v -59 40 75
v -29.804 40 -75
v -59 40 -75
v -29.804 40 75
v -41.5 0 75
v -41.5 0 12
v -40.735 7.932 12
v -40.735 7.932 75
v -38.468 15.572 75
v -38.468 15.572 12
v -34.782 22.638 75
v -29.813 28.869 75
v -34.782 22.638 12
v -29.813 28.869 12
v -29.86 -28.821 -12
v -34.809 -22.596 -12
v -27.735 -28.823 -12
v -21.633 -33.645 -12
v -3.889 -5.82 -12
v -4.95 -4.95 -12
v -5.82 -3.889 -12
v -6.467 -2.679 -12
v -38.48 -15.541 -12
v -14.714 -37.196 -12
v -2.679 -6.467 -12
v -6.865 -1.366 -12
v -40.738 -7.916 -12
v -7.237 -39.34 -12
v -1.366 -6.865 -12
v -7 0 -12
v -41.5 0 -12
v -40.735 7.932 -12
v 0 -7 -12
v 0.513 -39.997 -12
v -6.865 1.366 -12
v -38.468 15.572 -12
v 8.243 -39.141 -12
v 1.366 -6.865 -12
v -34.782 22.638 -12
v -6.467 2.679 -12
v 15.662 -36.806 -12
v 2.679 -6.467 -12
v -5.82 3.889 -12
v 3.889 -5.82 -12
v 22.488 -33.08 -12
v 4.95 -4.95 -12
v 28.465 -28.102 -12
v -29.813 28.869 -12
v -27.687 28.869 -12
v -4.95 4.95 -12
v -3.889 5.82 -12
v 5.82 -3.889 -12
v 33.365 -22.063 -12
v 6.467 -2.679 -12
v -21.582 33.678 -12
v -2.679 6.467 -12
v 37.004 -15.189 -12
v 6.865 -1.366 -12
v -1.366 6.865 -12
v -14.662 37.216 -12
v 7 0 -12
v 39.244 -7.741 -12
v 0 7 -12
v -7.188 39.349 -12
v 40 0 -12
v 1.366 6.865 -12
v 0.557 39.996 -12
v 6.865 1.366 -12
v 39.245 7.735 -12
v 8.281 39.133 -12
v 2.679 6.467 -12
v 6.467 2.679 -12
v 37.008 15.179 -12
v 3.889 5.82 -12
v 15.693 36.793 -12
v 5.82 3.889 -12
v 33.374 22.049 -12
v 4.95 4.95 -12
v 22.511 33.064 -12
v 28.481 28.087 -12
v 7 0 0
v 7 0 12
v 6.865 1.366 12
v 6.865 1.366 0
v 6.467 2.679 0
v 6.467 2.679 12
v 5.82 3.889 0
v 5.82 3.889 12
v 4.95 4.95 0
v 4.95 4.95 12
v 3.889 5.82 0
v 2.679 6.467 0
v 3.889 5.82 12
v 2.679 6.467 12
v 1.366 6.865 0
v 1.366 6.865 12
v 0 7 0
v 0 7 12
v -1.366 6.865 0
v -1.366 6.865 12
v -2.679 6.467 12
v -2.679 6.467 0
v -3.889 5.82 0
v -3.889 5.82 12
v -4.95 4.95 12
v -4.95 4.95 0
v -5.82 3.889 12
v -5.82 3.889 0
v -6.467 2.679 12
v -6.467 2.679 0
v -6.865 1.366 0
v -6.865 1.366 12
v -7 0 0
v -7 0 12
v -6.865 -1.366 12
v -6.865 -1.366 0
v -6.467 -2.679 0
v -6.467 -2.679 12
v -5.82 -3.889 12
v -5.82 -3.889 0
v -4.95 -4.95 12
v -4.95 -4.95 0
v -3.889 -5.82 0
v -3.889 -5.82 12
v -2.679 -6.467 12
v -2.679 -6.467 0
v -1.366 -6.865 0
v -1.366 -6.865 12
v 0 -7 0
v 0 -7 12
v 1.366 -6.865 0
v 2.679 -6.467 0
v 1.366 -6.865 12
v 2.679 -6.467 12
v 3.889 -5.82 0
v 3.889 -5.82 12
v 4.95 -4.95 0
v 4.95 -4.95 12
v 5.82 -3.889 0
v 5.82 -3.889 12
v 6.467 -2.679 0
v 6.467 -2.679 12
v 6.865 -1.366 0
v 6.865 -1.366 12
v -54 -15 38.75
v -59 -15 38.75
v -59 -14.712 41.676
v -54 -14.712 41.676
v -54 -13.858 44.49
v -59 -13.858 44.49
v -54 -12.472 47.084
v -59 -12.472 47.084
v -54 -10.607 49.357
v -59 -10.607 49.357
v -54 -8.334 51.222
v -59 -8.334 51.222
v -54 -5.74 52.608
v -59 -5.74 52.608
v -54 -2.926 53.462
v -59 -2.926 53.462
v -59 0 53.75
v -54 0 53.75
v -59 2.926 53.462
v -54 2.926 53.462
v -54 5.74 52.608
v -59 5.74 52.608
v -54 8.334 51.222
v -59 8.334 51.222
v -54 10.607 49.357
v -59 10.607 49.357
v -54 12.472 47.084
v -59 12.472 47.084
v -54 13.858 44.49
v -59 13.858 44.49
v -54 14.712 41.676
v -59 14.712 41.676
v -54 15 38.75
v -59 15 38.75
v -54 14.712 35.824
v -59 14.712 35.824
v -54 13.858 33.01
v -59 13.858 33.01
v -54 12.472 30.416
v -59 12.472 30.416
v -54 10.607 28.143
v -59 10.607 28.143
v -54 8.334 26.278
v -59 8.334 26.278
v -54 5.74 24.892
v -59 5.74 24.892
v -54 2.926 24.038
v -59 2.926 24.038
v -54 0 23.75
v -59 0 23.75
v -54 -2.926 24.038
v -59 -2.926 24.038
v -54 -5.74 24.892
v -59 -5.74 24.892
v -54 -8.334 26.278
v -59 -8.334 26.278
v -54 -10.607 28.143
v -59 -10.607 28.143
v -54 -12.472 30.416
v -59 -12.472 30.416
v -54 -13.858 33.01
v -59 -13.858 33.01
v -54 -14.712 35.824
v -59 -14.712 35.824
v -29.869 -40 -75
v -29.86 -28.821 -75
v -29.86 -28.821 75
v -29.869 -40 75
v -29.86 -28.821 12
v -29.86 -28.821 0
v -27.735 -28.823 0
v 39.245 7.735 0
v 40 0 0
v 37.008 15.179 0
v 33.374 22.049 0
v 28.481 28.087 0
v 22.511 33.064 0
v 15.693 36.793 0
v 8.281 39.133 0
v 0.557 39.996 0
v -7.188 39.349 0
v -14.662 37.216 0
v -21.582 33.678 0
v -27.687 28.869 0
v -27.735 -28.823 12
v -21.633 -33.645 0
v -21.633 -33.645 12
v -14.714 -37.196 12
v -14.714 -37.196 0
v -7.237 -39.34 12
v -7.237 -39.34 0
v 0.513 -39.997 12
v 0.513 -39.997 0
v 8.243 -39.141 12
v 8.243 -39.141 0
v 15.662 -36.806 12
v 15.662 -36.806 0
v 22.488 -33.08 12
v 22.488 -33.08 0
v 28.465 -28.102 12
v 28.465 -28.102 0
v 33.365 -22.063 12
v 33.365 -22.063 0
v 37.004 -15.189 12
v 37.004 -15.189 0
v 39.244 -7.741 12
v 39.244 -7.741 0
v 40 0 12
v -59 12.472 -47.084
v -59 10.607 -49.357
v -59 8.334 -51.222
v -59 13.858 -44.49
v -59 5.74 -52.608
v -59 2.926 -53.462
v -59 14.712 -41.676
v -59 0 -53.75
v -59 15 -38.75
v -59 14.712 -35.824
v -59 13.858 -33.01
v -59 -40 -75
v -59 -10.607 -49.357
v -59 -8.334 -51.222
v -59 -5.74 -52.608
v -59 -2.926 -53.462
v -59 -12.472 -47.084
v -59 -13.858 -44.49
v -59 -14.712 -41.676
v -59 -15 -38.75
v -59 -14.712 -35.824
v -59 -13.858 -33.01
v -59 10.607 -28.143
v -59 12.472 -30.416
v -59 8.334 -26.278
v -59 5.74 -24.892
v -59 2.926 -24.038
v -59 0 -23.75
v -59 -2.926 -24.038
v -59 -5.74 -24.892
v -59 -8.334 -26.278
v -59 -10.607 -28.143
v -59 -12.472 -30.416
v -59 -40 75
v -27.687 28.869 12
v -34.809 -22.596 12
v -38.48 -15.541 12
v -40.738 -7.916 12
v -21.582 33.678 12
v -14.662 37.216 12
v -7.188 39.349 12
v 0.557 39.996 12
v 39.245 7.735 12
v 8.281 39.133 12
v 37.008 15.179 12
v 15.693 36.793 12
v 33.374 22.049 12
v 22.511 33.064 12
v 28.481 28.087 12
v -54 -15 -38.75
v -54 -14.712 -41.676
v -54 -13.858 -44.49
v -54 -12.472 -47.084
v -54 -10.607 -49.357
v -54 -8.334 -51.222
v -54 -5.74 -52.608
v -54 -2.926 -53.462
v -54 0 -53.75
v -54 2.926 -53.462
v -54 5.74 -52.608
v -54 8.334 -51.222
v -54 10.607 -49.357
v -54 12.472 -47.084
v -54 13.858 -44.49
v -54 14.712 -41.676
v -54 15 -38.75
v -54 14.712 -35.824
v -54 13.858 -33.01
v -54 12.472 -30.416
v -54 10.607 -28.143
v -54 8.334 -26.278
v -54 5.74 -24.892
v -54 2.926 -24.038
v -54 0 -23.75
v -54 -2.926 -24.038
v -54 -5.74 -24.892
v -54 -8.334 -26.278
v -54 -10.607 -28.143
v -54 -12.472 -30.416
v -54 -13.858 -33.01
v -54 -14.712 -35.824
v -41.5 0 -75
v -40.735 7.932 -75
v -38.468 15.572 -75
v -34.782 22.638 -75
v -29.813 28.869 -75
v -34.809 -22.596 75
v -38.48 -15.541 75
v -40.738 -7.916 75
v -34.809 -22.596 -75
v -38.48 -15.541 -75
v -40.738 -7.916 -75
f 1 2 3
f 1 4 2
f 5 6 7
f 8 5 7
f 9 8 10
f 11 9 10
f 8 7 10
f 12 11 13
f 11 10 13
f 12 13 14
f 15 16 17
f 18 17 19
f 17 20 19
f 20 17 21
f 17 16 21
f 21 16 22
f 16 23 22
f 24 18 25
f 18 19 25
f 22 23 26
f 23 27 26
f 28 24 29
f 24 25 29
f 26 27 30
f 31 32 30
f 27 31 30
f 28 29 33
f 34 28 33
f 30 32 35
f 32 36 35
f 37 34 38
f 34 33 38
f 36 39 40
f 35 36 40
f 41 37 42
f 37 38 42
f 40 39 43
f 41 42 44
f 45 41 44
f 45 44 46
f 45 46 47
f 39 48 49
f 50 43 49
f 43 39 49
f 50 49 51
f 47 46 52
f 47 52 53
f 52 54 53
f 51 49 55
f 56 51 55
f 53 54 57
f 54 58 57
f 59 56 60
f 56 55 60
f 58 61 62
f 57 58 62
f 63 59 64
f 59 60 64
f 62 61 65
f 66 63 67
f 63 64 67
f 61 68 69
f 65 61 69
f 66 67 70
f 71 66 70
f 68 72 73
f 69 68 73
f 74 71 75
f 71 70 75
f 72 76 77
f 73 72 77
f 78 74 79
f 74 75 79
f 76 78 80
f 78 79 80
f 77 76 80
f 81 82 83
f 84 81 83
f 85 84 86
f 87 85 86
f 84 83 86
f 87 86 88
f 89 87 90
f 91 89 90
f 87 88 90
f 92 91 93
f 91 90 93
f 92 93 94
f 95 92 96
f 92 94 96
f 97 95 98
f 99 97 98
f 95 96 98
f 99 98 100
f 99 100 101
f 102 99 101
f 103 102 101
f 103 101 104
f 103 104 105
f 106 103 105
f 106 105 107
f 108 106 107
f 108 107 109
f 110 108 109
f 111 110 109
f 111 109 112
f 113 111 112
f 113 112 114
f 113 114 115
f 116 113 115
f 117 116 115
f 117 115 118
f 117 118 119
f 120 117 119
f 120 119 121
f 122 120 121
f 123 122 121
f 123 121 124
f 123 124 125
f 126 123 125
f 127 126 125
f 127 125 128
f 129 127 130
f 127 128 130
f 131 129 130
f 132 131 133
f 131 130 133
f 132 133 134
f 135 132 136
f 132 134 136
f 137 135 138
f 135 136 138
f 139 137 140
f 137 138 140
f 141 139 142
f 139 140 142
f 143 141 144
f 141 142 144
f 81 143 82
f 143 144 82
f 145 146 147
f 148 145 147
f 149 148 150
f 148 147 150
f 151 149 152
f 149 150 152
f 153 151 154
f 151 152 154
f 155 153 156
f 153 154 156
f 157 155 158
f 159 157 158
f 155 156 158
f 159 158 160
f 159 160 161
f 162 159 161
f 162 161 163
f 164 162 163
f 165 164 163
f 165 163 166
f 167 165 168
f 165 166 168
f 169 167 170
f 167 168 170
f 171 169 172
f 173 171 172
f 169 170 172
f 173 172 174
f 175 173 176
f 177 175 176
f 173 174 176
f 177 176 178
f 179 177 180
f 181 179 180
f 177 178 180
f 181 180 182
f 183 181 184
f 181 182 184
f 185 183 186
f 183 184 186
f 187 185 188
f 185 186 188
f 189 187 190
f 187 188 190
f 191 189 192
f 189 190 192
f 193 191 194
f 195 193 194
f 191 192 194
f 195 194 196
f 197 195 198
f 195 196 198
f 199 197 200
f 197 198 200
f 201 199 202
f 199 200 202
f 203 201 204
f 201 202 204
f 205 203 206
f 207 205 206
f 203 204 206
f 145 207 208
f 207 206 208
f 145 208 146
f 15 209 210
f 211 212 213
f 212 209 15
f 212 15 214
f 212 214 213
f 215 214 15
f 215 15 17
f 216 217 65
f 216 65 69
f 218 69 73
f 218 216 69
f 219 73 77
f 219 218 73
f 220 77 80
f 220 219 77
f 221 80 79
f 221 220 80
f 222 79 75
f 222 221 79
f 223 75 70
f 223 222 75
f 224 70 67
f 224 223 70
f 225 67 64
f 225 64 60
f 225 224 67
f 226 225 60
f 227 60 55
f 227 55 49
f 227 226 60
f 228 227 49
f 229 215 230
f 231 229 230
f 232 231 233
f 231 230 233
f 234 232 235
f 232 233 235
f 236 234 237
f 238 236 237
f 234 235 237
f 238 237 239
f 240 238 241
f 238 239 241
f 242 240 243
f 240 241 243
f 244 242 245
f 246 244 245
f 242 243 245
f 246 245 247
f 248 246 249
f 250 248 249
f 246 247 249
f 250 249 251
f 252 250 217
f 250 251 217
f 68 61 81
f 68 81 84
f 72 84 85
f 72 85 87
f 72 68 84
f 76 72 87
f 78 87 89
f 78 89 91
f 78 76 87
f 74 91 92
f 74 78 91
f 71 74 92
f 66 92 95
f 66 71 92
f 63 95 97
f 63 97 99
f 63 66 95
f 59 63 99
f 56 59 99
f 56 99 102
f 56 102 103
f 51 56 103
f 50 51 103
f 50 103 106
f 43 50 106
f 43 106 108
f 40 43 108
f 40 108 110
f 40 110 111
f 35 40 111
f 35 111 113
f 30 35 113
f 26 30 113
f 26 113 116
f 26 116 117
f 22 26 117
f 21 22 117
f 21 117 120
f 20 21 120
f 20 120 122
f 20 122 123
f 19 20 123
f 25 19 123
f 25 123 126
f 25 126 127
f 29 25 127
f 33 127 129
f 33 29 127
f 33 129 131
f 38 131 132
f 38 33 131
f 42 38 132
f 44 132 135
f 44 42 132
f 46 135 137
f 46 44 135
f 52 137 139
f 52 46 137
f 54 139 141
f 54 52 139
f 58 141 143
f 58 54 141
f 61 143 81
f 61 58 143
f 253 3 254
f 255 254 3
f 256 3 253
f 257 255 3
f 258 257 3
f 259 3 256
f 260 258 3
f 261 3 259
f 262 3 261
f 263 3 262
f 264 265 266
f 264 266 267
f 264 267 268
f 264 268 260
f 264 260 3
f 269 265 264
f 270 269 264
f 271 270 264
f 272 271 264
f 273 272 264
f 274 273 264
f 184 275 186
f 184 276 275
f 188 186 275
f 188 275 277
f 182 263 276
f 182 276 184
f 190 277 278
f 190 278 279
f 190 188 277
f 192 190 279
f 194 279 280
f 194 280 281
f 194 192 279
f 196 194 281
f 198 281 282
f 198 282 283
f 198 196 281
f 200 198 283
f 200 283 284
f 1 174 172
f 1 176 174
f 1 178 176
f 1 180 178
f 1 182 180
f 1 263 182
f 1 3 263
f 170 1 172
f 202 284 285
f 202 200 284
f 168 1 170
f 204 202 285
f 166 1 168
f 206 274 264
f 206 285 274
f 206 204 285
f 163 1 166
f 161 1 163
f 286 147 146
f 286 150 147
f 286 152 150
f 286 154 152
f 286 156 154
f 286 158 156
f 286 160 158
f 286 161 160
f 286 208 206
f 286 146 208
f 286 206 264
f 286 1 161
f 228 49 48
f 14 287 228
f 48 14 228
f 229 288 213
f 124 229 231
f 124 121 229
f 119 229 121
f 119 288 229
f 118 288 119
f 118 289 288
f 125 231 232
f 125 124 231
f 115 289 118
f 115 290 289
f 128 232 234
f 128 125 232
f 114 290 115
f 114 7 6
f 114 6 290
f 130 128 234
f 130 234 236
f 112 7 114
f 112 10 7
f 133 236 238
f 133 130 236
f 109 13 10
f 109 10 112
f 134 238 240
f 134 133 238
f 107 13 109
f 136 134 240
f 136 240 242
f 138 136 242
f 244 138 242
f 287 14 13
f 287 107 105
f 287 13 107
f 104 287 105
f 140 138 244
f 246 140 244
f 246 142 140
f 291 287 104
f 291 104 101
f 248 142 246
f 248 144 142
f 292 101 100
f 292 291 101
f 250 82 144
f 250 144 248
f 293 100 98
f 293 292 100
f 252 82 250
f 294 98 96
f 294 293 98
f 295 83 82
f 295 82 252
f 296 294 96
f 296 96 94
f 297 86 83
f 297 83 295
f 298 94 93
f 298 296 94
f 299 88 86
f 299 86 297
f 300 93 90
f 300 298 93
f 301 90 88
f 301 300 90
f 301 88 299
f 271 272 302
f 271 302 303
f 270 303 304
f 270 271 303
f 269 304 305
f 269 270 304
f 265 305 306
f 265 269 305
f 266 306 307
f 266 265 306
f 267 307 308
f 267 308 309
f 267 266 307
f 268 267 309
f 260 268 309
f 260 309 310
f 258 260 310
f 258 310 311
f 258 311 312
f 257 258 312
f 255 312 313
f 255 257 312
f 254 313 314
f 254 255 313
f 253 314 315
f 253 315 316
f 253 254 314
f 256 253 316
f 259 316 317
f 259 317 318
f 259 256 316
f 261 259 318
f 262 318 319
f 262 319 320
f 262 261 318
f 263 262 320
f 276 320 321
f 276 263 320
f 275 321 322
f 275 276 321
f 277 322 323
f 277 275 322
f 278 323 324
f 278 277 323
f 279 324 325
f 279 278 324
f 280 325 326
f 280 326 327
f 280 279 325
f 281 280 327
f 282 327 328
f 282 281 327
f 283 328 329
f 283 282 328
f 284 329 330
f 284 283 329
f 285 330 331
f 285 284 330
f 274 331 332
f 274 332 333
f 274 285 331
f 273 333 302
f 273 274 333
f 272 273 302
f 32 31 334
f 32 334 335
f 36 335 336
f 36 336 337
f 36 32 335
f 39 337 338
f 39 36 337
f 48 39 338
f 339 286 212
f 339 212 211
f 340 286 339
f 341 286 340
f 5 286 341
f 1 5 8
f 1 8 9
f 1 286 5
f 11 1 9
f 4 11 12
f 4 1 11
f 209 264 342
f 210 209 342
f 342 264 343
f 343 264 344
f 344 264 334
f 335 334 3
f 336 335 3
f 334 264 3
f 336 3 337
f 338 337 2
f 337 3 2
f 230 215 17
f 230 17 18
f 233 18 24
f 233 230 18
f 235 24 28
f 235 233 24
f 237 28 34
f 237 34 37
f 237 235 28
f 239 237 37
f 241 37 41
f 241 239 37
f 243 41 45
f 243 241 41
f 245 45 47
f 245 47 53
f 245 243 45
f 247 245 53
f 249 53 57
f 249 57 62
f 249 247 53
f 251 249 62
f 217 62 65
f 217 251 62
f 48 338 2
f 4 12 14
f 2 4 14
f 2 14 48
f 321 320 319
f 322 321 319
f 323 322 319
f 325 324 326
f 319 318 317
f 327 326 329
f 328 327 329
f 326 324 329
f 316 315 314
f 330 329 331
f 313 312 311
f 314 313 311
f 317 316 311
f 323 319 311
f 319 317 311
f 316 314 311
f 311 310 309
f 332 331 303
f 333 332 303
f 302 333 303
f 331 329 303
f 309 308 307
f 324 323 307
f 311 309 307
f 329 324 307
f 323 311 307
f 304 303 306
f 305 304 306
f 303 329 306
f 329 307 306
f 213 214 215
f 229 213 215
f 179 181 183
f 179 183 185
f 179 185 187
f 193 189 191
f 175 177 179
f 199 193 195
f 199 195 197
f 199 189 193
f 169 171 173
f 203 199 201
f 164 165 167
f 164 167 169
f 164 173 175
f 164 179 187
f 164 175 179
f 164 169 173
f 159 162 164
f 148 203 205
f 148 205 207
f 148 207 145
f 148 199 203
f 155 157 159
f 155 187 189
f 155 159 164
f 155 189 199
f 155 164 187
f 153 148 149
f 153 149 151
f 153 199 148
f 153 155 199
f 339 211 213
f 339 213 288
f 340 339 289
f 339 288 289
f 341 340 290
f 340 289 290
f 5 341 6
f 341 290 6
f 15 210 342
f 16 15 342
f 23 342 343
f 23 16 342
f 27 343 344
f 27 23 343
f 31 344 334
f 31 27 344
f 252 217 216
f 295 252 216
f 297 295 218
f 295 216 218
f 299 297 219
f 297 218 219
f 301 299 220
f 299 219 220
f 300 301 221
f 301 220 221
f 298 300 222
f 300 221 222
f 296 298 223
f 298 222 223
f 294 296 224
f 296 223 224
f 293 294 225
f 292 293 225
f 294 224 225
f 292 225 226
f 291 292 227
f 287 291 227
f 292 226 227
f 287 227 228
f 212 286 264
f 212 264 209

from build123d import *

# Parameters (mm, degrees)
F1_DEPTH = 12
F2_DEPTH = 75
F3_R     = 7
F4_DEPTH = 25
F5_R     = 15
F6_DEPTH = 5


with BuildPart() as f1:
    # F0 (on Top) → F1 (new body)
    with BuildSketch(Plane.XY):
        with BuildLine():
            ThreePointArc((-27.6872290695, 28.8689685727), (-28.772246751, 27.7877278111), (-29.8150709224, 26.6657373026))
            Line((-29.8150709224, 26.6657373026), (-29.8579817649, -26.6176806827))
            ThreePointArc((-29.8579817649, -26.6176806827), (-28.8178231022, -27.7404591103), (-27.7354722388, -28.8226227067))
            ThreePointArc((-27.7354722388, -28.8226227067), (15.6617545385, -36.8063777731), (40, 0))
            ThreePointArc((40, 0), (15.6925274768, 36.7932681532), (-27.6872290695, 28.8689685727))
        make_face()
        with BuildLine():
            Line((-27.6872290695, 28.8689685727), (-29.8132965897, 28.8689685727))
            Line((-29.8132965897, 28.8689685727), (-29.8150709224, 26.6657373026))
            ThreePointArc((-29.8150709224, 26.6657373026), (-28.772246751, 27.7877278111), (-27.6872290695, 28.8689685727))
        make_face()
        with BuildLine():
            Line((-29.8150709224, 26.6657373026), (-29.8132965897, 28.8689685727))
            ThreePointArc((-29.8132965897, 28.8689685727), (-38.4675305191, 15.5723824691), (-41.5, 0))
            ThreePointArc((-41.5, 0), (-38.480058979, -15.5413982954), (-29.8597560976, -28.8209119529))
            Line((-29.8597560976, -28.8209119529), (-29.8579817649, -26.6176806827))
            ThreePointArc((-29.8579817649, -26.6176806827), (-39.9999870288, 0.0322132702), (-29.8150709224, 26.6657373026))
        make_face()
        with BuildLine():
            Line((-29.8579817649, -26.6176806827), (-29.8150709224, 26.6657373026))
            ThreePointArc((-29.8150709224, 26.6657373026), (-39.9999870288, 0.0322132702), (-29.8579817649, -26.6176806827))
        make_face()
        with BuildLine():
            Line((-29.8579817649, -26.6176806827), (-29.8597560976, -28.8209119529))
            Line((-29.8597560976, -28.8209119529), (-27.7354722388, -28.8226227067))
            ThreePointArc((-27.7354722388, -28.8226227067), (-28.8178231022, -27.7404591103), (-29.8579817649, -26.6176806827))
        make_face()
    extrude(amount=F1_DEPTH)

    # F0 (on Top) → F2 (join)
    with BuildSketch(Plane.XY):
        with BuildLine():
            Line((-29.8043321806, 40.0002894977), (-59, 40.0002894977))
            Line((-59, 40.0002894977), (-59, -39.9997105023))
            Line((-59, -39.9997105023), (-29.8687587419, -39.9997105023))
            Line((-29.8687587419, -39.9997105023), (-29.8597560976, -28.8209119529))
            ThreePointArc((-29.8597560976, -28.8209119529), (-38.480058979, -15.5413982954), (-41.5, 0))
            ThreePointArc((-41.5, 0), (-38.4675305191, 15.5723824691), (-29.8132965897, 28.8689685727))
            Line((-29.8132965897, 28.8689685727), (-29.8043321806, 40.0002894977))
        make_face()
    extrude(amount=F2_DEPTH)

    # F3 (on face) → F4 (cut)
    with BuildSketch(Plane.XY.offset(12)):
        Circle(F3_R)
    extrude(amount=-F4_DEPTH, mode=Mode.SUBTRACT)

    # F5 (on face) → F6 (cut)
    with BuildSketch(Plane(origin=(-59, 0, 0), x_dir=(0, -1, 0), z_dir=(-1, 0, 0))):
        with Locations((0, 38.75)):
            Circle(F5_R)
    extrude(amount=-F6_DEPTH, mode=Mode.SUBTRACT)

    # F7: F1 across plane


with BuildPart() as f1_1:
    add(f1.part)
    add(f1.part.mirror(Plane.XY))


solid = f1_1.part
